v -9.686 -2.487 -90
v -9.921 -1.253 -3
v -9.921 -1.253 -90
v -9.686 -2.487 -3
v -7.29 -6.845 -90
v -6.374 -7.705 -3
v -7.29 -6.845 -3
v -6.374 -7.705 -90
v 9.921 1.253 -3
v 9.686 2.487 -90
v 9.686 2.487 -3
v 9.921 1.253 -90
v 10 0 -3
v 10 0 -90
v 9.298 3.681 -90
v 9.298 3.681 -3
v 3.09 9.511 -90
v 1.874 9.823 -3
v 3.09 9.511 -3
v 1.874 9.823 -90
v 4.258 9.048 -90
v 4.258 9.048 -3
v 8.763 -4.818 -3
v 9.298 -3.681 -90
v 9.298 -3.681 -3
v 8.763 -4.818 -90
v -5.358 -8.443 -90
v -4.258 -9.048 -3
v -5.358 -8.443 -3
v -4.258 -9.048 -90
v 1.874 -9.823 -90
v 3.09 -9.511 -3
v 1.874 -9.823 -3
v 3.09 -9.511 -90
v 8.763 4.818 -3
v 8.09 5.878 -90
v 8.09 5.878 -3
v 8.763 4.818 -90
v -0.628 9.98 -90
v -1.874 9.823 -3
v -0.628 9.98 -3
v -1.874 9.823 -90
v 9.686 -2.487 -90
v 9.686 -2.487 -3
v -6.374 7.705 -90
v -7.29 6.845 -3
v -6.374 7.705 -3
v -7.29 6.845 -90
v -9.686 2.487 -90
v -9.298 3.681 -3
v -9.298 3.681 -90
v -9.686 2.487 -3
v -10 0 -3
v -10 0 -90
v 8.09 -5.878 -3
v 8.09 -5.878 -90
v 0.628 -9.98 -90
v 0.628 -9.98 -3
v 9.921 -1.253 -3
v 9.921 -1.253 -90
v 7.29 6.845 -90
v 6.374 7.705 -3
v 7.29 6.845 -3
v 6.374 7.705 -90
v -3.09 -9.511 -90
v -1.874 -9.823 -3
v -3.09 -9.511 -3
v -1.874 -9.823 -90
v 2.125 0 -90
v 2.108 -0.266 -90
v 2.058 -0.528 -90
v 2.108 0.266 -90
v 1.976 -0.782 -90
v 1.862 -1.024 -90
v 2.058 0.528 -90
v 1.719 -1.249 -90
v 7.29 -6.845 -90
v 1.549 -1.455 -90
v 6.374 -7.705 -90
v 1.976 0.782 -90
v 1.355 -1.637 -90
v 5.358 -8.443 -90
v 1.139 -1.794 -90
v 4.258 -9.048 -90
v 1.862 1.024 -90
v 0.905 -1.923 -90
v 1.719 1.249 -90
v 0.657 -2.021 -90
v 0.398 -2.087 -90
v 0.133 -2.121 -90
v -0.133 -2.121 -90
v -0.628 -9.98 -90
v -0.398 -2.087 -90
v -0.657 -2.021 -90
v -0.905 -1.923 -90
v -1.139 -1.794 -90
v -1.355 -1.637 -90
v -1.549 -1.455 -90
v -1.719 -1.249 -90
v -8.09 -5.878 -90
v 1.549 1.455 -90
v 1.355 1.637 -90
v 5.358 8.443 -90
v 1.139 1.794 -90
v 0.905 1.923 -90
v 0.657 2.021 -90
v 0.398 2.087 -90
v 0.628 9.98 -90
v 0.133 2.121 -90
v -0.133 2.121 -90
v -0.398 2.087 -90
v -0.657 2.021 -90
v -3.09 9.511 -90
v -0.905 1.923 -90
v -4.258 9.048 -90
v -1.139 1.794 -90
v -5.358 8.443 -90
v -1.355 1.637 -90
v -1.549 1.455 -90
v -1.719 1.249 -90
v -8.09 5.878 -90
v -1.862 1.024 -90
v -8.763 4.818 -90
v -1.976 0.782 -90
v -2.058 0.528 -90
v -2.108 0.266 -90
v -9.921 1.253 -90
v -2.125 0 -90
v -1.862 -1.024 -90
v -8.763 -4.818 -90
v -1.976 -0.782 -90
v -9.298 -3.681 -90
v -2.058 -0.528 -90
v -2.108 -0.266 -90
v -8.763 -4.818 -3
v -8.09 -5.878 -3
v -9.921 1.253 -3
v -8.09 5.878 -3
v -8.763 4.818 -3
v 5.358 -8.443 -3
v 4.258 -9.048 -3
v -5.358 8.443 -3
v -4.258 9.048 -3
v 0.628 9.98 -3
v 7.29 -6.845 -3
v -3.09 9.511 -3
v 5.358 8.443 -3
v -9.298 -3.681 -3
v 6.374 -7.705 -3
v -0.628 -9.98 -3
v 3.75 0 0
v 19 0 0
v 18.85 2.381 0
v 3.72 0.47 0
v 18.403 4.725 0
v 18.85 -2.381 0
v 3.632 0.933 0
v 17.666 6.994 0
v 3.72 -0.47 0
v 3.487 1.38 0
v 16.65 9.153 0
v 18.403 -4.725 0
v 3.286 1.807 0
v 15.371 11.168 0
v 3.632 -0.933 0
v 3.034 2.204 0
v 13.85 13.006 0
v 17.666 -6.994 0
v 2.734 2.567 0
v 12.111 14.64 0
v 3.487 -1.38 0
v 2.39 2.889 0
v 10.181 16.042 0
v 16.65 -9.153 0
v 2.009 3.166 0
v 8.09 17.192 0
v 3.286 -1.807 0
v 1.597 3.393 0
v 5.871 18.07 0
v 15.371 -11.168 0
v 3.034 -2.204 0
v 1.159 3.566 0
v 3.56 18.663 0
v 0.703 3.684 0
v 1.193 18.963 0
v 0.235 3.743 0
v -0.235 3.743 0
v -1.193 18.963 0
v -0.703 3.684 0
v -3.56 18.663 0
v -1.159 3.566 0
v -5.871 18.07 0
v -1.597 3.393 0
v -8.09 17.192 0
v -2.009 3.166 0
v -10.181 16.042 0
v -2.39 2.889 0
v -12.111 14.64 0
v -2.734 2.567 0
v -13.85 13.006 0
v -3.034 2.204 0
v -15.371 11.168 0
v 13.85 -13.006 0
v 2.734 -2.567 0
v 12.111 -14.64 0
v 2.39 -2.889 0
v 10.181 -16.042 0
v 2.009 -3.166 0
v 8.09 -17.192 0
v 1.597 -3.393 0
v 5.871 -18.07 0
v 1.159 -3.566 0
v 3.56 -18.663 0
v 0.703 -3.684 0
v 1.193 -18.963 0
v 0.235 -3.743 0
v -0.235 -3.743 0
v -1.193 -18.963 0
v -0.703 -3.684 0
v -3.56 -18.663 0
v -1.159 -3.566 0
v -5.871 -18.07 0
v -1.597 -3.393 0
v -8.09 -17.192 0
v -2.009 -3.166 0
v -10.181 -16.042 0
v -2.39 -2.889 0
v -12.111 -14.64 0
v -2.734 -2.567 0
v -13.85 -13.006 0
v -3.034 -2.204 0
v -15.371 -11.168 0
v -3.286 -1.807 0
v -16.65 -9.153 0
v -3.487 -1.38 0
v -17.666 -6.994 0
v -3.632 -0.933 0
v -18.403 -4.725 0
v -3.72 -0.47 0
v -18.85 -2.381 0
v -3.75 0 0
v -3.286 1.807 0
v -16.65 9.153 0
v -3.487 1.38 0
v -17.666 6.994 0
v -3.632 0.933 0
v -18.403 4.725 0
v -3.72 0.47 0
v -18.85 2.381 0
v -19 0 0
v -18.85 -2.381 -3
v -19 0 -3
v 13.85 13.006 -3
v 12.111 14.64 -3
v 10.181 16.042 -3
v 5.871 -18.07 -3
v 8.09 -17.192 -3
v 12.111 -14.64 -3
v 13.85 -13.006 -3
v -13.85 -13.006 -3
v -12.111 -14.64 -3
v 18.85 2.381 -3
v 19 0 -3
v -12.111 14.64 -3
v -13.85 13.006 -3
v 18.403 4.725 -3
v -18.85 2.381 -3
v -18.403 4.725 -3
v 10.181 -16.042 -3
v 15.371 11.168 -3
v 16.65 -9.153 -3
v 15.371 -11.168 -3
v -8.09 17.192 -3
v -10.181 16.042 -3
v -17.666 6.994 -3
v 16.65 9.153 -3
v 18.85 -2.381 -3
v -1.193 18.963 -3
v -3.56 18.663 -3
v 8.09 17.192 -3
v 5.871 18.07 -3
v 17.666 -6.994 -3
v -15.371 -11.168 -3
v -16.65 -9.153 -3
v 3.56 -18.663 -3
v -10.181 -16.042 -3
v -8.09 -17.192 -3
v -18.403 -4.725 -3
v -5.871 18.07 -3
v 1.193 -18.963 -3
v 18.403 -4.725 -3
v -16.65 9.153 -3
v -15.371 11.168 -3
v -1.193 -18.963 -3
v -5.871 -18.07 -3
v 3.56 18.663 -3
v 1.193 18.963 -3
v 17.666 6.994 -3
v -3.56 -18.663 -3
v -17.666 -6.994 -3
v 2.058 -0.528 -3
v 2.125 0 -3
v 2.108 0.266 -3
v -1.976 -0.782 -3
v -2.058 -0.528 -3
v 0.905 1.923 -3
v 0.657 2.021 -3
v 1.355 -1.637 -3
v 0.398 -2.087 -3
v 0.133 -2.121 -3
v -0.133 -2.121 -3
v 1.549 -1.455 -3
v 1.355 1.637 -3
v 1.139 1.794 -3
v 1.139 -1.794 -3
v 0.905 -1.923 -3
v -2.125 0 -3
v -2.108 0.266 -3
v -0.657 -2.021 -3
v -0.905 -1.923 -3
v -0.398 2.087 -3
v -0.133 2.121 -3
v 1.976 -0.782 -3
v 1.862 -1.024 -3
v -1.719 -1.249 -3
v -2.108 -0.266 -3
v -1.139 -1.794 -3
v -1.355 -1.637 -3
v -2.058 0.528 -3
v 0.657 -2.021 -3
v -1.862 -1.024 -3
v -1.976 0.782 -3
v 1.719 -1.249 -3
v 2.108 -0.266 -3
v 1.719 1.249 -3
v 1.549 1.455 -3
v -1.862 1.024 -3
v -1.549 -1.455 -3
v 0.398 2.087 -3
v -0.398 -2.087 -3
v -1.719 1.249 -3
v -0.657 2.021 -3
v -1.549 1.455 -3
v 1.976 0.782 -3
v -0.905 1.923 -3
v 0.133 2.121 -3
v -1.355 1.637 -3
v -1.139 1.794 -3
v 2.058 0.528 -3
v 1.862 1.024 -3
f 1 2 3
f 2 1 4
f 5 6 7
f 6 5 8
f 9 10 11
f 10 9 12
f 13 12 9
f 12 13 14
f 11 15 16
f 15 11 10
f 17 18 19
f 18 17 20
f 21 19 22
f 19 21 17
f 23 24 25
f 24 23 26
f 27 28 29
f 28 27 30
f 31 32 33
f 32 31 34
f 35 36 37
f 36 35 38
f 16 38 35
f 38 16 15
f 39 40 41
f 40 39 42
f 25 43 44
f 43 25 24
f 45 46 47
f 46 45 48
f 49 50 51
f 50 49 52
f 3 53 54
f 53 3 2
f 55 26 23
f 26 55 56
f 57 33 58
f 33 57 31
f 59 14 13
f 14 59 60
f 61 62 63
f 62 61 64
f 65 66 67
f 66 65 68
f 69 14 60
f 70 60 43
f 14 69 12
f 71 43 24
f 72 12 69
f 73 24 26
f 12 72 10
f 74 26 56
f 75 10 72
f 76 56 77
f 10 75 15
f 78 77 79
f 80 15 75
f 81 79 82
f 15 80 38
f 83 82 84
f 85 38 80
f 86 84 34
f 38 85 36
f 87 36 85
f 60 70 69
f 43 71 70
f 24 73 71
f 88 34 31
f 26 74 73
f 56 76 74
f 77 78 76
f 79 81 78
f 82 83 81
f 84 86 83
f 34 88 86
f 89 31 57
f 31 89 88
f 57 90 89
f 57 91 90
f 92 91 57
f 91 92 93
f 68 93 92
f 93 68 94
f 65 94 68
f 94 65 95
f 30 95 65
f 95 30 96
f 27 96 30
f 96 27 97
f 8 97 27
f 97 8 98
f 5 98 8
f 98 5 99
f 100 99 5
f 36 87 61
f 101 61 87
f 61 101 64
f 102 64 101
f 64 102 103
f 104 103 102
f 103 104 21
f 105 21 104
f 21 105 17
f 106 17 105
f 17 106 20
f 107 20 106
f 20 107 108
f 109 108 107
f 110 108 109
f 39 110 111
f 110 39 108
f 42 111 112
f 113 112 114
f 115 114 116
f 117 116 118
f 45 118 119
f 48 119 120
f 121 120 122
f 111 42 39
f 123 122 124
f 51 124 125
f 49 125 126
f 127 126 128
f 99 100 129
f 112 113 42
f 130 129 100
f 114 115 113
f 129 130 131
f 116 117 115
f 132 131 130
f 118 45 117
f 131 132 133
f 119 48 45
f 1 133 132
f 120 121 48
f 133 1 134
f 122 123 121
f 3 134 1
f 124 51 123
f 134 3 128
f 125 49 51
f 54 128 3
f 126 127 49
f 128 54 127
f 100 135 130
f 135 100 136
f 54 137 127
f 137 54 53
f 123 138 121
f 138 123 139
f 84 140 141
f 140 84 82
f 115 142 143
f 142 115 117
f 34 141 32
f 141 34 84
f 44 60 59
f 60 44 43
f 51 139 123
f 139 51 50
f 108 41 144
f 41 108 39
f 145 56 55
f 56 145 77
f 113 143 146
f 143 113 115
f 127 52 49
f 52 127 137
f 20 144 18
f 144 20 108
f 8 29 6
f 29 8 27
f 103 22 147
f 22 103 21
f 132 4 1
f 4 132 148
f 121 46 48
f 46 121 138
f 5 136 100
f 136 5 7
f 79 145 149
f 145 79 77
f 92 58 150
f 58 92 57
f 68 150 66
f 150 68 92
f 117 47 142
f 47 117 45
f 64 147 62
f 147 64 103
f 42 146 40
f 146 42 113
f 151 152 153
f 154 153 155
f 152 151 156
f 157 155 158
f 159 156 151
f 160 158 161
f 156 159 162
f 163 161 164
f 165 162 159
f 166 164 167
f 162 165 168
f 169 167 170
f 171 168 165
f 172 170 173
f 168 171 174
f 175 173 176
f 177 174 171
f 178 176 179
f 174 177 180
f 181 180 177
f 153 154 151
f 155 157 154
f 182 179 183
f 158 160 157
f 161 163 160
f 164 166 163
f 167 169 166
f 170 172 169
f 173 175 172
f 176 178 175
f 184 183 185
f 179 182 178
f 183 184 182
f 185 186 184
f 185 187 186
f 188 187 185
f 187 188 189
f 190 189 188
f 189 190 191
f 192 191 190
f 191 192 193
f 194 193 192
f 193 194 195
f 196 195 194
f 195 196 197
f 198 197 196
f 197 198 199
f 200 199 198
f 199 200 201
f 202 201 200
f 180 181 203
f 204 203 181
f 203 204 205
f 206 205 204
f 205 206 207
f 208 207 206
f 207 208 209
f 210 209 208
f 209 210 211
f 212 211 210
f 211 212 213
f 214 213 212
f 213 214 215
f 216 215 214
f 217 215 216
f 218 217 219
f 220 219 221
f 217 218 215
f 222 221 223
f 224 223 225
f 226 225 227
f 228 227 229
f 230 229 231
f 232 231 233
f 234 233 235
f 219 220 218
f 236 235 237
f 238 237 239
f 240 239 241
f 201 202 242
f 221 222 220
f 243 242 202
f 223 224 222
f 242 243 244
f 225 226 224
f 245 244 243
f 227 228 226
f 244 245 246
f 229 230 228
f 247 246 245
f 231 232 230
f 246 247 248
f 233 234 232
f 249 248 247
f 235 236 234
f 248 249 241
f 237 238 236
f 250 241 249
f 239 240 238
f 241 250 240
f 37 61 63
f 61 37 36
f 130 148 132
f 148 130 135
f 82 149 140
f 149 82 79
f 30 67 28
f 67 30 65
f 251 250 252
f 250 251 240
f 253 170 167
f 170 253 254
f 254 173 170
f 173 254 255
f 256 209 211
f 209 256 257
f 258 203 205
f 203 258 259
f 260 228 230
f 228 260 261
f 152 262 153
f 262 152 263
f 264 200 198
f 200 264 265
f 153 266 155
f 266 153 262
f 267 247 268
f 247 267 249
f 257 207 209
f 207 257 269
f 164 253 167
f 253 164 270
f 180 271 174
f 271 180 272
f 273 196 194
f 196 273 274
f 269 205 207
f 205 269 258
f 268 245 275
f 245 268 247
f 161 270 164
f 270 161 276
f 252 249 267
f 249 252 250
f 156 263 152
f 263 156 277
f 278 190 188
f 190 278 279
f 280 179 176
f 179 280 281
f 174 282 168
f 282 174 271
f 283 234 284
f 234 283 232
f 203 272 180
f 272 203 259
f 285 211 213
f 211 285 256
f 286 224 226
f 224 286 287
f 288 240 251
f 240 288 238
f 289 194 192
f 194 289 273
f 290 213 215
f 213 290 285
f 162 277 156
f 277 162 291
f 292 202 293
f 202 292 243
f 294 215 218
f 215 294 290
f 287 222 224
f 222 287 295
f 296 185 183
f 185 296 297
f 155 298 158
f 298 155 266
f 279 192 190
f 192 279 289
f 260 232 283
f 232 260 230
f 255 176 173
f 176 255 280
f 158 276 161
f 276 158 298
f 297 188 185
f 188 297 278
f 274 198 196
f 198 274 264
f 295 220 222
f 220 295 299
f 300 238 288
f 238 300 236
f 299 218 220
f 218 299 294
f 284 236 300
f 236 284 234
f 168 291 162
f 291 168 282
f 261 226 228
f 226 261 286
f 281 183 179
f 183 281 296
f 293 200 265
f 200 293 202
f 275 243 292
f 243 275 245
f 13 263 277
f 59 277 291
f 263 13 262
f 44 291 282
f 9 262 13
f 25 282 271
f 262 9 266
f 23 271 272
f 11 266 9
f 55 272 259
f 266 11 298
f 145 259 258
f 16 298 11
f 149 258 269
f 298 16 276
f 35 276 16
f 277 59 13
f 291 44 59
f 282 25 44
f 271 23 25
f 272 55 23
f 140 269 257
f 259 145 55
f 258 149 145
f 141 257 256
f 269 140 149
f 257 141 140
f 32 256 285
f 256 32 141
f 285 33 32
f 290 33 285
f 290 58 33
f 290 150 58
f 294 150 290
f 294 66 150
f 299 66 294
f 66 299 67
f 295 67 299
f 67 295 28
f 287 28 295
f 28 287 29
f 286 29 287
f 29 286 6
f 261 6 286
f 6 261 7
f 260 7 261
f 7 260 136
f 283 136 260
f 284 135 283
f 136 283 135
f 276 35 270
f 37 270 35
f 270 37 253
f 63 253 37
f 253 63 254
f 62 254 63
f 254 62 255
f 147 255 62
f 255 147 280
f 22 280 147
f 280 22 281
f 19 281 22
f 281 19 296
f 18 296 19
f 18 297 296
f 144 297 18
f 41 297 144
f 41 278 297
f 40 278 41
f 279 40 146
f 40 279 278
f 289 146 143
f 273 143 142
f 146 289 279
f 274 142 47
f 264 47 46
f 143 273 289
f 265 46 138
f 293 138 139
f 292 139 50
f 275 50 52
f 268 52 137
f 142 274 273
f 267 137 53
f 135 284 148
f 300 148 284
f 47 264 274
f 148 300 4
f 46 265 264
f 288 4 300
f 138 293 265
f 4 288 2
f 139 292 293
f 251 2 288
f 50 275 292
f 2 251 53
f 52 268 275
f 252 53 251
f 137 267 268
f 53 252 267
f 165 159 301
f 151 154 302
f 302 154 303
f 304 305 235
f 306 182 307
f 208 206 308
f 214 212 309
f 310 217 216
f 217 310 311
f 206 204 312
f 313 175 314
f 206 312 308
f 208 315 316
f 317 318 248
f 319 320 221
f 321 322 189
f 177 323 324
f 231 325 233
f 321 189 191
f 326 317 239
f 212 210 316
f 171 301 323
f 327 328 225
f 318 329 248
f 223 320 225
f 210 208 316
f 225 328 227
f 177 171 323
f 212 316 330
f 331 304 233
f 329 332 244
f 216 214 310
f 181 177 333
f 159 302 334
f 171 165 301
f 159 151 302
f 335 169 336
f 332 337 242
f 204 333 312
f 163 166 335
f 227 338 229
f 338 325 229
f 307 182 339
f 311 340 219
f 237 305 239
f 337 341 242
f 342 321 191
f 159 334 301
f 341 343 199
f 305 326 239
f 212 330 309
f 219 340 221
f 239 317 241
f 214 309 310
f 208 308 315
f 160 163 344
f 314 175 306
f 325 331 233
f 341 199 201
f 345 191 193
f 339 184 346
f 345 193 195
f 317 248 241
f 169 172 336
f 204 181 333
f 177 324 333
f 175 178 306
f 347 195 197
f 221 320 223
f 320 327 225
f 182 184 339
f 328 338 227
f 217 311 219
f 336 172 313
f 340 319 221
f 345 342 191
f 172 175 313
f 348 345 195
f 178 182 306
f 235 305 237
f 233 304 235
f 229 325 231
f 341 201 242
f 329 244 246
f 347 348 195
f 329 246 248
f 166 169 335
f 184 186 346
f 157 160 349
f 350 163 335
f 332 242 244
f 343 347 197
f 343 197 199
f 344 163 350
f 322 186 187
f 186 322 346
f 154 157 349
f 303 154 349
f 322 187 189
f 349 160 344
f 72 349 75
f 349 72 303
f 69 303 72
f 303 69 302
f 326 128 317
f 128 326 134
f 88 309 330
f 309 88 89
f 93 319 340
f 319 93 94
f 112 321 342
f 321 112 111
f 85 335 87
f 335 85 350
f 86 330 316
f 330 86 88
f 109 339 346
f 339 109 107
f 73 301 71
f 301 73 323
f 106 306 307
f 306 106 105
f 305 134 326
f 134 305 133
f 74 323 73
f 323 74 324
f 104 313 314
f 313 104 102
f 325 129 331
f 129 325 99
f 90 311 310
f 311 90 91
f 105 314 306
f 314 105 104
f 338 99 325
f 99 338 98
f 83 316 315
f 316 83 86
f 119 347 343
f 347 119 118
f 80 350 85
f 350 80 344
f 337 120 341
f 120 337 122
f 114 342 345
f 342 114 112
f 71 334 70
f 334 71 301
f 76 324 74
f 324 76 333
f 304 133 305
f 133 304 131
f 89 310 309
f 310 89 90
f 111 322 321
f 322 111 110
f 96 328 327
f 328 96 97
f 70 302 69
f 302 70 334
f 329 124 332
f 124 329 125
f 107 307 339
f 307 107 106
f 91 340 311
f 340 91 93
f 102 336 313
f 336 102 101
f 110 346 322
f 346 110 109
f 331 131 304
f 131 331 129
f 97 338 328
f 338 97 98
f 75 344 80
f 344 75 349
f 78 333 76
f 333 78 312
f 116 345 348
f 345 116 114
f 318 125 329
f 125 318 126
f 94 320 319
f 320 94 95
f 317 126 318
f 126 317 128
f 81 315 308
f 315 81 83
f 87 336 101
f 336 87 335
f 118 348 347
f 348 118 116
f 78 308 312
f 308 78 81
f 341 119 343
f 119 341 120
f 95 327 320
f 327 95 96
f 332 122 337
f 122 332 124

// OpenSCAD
$fn = 50;


difference() {
	union() {
		translate(v = [0, 0, -90.0000000000]) {
			cylinder(h = 90, r = 10.0000000000);
		}
		translate(v = [0, 0, -3.0000000000]) {
			cylinder(h = 3, r = 19.0000000000);
		}
	}
	union() {
		translate(v = [0, 0, 0]) {
			rotate(a = [0, 0, 0]) {
				difference() {
					union() {
						#translate(v = [0, 0, -90.0000000000]) {
							cylinder(h = 90, r = 2.0000000000);
						}
						#translate(v = [0, 0, -3]) {
							cylinder(h = 3, r1 = 2.1250000000, r2 = 3.7500000000);
						}
						#translate(v = [0, 0, -90.0000000000]) {
							cylinder(h = 90, r = 2.1250000000);
						}
						#translate(v = [0, 0, -90.0000000000]) {
							cylinder(h = 90, r = 2.0000000000);
						}
					}
					union();
				}
			}
		}
	}
}
